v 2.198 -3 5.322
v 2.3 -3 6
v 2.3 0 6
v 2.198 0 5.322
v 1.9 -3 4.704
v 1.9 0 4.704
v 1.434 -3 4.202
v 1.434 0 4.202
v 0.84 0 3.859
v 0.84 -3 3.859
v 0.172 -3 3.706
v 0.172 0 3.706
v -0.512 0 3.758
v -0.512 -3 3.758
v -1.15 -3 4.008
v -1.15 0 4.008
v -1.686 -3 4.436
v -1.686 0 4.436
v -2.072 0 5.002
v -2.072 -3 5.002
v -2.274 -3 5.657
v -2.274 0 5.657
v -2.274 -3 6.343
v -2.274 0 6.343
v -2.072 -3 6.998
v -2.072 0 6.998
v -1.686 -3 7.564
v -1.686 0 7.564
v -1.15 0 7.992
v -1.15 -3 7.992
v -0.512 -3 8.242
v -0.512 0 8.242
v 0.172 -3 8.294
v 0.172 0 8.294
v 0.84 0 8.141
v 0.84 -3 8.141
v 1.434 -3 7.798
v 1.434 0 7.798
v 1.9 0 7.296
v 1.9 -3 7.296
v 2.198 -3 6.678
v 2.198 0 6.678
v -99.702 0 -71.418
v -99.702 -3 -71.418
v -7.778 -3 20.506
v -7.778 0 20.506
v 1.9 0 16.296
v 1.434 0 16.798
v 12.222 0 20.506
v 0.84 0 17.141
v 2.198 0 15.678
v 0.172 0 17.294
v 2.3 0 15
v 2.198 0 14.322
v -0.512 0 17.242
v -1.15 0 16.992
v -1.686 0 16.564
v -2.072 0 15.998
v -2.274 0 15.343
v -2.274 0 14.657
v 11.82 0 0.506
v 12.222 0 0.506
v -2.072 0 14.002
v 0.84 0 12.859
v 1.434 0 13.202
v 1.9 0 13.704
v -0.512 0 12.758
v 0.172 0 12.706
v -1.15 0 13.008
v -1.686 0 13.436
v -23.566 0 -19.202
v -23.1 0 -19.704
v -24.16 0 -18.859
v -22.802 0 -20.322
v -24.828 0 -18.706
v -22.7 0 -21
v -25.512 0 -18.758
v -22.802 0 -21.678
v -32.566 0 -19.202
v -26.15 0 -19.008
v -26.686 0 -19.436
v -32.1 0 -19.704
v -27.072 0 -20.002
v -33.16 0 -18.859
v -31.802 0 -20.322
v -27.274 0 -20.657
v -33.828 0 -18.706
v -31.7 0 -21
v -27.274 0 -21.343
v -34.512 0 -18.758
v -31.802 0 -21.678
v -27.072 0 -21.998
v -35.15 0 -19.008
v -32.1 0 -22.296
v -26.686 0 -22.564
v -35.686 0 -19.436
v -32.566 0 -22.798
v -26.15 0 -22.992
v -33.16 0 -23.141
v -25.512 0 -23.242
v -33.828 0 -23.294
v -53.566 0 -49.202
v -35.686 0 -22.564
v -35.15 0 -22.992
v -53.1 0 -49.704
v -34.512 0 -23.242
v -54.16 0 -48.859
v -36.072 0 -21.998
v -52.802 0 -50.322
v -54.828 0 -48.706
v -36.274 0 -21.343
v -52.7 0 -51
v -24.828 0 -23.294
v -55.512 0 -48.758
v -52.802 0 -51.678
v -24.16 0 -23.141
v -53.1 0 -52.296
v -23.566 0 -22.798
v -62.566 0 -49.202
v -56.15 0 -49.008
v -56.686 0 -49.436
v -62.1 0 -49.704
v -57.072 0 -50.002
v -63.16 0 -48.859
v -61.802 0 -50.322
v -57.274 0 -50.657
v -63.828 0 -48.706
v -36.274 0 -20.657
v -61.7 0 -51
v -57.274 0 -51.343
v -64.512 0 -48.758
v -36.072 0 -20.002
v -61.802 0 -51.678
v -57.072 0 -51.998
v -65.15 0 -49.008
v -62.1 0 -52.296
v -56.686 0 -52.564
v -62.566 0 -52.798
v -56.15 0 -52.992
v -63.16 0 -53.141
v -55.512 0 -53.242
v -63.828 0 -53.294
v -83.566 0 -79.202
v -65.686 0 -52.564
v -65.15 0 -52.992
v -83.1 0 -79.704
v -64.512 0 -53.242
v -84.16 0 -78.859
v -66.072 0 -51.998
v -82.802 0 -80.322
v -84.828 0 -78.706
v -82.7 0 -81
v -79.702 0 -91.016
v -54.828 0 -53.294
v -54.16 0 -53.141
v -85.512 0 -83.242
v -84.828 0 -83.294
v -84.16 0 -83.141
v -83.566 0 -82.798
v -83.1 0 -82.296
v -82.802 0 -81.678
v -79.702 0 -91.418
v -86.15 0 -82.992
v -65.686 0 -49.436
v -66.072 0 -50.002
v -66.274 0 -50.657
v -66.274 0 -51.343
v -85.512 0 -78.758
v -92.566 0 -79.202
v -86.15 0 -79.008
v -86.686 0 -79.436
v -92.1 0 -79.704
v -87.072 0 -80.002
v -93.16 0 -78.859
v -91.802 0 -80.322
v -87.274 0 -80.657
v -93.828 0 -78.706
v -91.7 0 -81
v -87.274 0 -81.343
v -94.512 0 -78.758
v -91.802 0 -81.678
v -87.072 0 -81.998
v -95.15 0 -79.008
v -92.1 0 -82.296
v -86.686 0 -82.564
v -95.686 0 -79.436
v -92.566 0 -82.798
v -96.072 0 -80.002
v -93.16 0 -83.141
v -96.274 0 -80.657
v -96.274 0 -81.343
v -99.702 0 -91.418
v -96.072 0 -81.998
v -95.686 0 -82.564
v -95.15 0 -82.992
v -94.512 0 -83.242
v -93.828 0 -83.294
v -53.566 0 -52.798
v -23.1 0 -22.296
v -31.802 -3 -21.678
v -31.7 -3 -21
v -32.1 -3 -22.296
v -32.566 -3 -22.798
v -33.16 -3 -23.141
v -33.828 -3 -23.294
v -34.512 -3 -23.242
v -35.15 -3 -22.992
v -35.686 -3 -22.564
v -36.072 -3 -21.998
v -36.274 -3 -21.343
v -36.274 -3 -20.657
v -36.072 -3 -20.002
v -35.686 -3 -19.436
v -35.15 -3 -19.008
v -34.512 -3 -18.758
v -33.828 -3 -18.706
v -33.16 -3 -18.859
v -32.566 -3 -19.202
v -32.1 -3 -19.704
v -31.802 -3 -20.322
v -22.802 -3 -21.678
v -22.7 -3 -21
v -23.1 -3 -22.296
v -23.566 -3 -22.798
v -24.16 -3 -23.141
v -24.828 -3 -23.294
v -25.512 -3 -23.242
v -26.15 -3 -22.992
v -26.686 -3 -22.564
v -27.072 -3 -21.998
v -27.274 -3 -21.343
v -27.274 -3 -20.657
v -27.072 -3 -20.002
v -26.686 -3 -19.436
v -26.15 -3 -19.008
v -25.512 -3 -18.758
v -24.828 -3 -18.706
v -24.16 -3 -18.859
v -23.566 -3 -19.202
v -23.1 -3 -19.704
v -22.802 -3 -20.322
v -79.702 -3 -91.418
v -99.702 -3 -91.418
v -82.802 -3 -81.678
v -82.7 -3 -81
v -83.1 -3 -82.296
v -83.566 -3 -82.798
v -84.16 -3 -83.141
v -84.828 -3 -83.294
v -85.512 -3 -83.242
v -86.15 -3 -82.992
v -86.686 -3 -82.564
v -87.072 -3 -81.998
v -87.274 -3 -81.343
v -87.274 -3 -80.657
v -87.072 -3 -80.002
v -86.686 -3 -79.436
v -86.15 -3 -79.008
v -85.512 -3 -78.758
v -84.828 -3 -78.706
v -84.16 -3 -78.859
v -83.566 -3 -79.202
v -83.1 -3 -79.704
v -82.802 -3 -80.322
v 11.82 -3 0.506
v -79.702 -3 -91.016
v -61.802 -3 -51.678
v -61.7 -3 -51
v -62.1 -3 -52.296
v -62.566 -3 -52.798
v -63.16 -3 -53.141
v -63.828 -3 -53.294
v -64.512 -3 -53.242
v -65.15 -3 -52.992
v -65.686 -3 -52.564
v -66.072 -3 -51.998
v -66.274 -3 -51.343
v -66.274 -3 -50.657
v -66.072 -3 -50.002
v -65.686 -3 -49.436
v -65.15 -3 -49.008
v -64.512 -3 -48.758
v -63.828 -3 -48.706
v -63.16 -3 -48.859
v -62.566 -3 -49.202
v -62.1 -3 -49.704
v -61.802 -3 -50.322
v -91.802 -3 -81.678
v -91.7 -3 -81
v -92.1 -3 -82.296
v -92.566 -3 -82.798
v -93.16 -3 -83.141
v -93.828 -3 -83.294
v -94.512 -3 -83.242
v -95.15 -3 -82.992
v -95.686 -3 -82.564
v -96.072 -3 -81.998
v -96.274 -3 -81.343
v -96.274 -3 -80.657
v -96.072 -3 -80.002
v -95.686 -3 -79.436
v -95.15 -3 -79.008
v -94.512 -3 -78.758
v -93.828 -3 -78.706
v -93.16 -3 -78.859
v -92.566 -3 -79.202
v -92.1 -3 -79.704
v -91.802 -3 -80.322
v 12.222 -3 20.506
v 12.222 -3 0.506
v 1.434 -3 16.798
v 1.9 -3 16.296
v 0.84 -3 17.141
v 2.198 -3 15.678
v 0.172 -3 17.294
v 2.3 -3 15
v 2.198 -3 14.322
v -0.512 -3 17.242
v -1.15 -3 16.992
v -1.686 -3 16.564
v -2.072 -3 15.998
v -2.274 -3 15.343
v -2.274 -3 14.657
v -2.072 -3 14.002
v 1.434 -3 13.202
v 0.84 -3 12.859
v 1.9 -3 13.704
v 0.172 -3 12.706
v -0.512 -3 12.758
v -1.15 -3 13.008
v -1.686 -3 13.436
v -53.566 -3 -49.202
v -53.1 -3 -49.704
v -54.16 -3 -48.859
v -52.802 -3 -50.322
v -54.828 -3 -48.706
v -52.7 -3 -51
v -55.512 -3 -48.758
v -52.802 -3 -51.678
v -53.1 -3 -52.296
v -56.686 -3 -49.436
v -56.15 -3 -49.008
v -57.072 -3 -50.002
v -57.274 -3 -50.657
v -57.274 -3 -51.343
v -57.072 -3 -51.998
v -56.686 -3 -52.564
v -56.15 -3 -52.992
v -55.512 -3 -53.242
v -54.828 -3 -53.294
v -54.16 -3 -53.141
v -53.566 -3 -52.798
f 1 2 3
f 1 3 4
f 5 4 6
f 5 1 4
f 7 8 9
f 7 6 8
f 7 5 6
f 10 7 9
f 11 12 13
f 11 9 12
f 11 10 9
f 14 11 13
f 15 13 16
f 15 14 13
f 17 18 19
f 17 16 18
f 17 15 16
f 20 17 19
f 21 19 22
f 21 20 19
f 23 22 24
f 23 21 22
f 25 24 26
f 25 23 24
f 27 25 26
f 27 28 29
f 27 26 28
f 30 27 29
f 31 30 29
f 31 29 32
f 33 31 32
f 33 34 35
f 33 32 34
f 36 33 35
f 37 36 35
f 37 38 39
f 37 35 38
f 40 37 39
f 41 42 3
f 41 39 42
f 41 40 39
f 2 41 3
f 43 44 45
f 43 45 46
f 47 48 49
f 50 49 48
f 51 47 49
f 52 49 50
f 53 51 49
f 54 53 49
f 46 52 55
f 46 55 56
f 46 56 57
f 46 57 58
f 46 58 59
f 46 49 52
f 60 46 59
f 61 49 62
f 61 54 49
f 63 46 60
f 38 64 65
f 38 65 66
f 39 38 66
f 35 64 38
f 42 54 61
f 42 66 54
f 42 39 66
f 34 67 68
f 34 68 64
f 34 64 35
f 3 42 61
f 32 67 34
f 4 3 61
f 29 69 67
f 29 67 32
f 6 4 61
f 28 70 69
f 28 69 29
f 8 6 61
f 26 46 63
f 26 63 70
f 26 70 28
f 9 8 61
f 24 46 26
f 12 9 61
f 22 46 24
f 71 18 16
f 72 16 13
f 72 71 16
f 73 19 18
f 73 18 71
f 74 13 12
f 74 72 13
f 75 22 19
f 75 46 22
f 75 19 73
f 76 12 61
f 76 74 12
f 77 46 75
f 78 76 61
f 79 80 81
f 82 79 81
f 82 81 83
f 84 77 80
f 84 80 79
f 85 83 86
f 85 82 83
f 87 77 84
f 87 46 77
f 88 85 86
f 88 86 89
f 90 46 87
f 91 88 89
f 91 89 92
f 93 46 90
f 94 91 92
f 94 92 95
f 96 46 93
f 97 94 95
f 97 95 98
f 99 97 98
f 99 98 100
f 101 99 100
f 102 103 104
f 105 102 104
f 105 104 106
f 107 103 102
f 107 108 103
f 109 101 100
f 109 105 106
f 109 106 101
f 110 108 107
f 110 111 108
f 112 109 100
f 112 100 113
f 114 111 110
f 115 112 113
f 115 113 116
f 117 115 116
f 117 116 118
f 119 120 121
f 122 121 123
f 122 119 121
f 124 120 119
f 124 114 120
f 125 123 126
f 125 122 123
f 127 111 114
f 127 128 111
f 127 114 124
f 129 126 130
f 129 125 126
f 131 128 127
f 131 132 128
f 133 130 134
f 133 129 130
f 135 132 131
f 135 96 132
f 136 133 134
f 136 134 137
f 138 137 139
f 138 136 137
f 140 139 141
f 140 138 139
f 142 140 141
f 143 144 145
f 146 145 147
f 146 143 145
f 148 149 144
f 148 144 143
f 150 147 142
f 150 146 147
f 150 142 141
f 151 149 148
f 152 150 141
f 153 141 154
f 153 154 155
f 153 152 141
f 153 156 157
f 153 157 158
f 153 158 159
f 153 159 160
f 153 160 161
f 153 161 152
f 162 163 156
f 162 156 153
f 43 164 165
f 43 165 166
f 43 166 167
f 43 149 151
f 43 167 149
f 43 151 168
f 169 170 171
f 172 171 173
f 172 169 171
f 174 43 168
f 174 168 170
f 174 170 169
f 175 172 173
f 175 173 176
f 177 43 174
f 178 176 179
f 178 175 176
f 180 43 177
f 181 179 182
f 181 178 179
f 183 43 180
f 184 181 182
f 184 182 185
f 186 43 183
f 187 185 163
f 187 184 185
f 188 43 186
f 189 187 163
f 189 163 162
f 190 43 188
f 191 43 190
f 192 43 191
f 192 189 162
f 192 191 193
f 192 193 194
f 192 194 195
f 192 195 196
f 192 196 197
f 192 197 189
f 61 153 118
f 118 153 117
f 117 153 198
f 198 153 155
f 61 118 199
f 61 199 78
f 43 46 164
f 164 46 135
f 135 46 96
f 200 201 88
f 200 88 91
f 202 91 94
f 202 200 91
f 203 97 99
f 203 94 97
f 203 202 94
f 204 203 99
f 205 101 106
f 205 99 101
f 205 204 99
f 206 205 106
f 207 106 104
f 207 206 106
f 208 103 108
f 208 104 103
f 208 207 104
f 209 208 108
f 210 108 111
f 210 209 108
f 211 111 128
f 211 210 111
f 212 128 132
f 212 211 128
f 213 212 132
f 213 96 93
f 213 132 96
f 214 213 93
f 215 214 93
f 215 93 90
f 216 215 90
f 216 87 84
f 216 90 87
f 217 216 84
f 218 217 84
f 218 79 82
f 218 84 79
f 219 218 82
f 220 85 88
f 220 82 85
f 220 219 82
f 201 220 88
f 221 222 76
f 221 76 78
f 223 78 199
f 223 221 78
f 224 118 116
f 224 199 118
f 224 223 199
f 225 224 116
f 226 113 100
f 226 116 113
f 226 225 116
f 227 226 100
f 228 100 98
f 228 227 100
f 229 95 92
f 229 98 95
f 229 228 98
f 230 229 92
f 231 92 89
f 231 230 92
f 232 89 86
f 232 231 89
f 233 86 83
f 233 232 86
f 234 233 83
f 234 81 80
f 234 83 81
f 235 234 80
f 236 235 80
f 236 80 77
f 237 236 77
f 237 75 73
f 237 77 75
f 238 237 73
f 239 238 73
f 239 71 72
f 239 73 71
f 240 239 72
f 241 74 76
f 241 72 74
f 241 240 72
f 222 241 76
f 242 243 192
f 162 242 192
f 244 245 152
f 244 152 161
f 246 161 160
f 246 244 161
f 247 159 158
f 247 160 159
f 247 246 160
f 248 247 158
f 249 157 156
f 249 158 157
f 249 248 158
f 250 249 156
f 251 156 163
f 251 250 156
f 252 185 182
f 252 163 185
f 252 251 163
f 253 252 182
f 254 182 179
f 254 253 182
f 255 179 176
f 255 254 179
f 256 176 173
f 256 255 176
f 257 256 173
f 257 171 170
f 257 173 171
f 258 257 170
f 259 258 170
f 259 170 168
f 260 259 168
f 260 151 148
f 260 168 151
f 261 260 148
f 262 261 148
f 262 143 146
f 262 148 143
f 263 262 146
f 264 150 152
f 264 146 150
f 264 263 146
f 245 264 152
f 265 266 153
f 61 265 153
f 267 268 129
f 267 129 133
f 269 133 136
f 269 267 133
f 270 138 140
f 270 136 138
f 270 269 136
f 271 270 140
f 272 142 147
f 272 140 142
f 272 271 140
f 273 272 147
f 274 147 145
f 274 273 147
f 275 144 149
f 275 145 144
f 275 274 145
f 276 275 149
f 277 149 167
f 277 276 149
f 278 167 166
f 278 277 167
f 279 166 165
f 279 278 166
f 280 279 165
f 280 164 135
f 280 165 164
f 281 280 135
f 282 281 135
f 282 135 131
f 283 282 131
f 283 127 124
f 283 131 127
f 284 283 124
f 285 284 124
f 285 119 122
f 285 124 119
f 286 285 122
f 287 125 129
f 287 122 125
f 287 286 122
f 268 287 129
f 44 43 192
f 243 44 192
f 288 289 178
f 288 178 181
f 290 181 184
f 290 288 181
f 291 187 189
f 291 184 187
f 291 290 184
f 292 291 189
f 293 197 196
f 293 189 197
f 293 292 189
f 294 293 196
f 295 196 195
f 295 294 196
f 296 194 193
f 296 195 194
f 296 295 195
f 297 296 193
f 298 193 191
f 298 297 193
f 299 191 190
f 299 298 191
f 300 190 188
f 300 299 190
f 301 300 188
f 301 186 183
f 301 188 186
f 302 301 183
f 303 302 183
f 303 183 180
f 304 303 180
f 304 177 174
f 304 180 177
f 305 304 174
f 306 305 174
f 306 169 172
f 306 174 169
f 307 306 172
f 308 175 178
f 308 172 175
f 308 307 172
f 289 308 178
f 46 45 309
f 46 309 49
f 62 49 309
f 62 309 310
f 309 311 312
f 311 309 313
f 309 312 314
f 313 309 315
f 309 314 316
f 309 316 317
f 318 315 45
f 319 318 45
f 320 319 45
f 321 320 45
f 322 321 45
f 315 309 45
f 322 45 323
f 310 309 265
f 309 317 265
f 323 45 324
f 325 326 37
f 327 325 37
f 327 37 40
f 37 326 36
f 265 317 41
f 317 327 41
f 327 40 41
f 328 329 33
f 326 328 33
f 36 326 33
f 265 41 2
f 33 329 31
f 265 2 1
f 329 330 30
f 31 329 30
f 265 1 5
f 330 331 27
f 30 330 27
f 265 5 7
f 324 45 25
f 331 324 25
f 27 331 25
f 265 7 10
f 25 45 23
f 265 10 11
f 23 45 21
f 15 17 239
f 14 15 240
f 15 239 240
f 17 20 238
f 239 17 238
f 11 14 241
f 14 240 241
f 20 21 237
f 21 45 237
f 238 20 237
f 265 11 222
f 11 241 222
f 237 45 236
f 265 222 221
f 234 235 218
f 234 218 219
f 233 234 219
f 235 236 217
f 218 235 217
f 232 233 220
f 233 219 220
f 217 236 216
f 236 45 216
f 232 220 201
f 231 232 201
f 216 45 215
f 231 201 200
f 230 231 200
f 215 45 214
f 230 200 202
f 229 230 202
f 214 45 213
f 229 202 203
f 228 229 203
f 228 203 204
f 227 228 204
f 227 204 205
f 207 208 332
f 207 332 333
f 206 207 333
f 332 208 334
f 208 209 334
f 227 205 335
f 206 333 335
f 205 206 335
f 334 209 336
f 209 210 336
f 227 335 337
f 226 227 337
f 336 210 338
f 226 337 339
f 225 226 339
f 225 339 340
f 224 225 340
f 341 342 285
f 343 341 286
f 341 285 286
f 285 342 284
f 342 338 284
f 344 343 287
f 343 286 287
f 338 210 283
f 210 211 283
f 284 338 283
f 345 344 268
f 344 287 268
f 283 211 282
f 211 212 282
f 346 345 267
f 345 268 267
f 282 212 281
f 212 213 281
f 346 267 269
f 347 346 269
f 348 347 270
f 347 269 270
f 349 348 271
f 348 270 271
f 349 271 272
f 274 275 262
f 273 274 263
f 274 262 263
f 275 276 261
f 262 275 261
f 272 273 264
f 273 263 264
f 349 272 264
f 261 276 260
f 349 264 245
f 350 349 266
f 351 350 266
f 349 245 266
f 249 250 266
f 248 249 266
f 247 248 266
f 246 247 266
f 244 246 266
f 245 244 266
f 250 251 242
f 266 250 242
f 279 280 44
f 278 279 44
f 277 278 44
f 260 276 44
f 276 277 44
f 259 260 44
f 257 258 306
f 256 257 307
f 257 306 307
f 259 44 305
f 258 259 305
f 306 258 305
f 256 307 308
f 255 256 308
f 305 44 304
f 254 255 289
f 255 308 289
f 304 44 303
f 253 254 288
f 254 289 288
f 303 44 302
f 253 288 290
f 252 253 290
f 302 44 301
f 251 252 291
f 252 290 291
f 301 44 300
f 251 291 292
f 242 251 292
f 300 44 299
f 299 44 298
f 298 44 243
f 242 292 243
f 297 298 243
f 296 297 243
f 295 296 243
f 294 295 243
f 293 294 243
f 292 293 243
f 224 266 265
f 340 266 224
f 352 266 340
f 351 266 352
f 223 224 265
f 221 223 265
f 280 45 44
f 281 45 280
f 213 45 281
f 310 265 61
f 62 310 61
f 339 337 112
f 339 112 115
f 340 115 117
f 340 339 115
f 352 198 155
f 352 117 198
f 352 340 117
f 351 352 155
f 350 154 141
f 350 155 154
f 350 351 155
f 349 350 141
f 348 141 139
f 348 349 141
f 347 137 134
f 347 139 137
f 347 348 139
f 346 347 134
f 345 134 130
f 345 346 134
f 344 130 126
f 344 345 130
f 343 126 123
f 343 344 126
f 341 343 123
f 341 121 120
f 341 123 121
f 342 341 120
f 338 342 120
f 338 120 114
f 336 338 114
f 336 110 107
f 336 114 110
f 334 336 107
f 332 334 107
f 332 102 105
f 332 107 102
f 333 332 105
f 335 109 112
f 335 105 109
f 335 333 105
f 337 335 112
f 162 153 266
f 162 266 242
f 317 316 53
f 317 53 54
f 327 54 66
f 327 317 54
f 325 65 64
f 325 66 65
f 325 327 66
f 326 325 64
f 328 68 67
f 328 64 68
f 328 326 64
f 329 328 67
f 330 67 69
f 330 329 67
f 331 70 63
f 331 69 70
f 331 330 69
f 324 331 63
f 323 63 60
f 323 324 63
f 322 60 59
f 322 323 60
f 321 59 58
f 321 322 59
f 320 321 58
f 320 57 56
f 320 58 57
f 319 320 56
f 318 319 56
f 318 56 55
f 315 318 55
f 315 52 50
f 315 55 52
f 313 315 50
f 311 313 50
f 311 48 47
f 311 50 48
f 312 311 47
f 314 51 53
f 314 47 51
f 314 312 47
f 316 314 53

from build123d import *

# Parameters (mm, degrees)
CYLINDER051_R             = 2.3
CYLINDER051_DEPTH         = 100
ARRAY001029_X_COUNT       = 2
ARRAY001029_X_PITCH       = 9
ARRAY001029_Z_COUNT       = 3
ARRAY001029_Z_PITCH       = 42.426407
CYLINDER048_R             = 2.3
CYLINDER048_DEPTH         = 100
ARRAY001026_Z_COUNT       = 2
ARRAY001026_Z_PITCH       = 9
BOX026_W                  = 20
BOX026_H                  = 3
BOX026_DEPTH              = 20
BOX026_PLACEMENT_ANGLE    = 45
BOX027_W                  = 20
BOX027_H                  = 3
BOX027_DEPTH              = 20
BOX027_PLACEMENT_ANGLE    = 45
BOX025_W                  = 28
BOX025_H                  = 3
BOX025_DEPTH              = 130
FUSION021_PLACEMENT_ANGLE = 45


with BuildPart() as horizontal_hole_array003:
    # Cylinder051 → Cylinder051 (new body)
    with BuildSketch(Plane(origin=(4, -10, 5), x_dir=(1, 0, 0), z_dir=(0, 1, 0))):
        Circle(CYLINDER051_R)
    extrude(amount=CYLINDER051_DEPTH)

    # Array001029 X: horizontal hole array003 ×2


with BuildPart() as horizontal_hole_array003_1:
    add(horizontal_hole_array003.part)
    with Locations(*[(i * ARRAY001029_X_PITCH, 0, 0) for i in range(1, ARRAY001029_X_COUNT)]):
        add(horizontal_hole_array003.part)

    # Array001029 Z: horizontal hole array003 ×3


with BuildPart() as horizontal_hole_array003_2:
    add(horizontal_hole_array003_1.part)
    with Locations(*[Vector(0.707107, 0, 0.707107) * (i * ARRAY001029_Z_PITCH) for i in range(1, ARRAY001029_Z_COUNT)]):
        add(horizontal_hole_array003_1.part)


with BuildPart() as horizontal_hole_array003_3:
    # Array001029 placement: moved
    add(horizontal_hole_array003_2.part.moved(Location((-98, 0, -86))))


with BuildPart() as fusion024:
    # Cylinder048 → Cylinder048 (new body)
    with BuildSketch(Plane(origin=(0, -10, 6), x_dir=(1, 0, 0), z_dir=(0, 1, 0))):
        Circle(CYLINDER048_R)
    extrude(amount=CYLINDER048_DEPTH)

    # Array001026 Z: Fusion024 ×2


with BuildPart() as fusion024_1:
    add(fusion024.part)
    with Locations(*[(0, 0, i * ARRAY001026_Z_PITCH) for i in range(1, ARRAY001026_Z_COUNT)]):
        add(fusion024.part)

    # Fusion024: union horizontal hole array003
    add(horizontal_hole_array003_3.part)


with BuildPart() as side_cube:
    # Box026 → Box026 (new body)
    with BuildSketch(Plane.XY):
        with Locations((10, 1.5)):
            Rectangle(BOX026_W, BOX026_H)
    extrude(amount=BOX026_DEPTH)


with BuildPart() as side_cube_1:
    # Box026 placement: moved
    add(side_cube.part.moved(Location((0, 0, 130))).rotate(Axis((0, 0, 130), (0, 1, 0)), BOX026_PLACEMENT_ANGLE))


with BuildPart() as side_cube001:
    # Box027 → Box027 (new body)
    with BuildSketch(Plane.XY):
        with Locations((10, 1.5)):
            Rectangle(BOX027_W, BOX027_H)
    extrude(amount=BOX027_DEPTH)


with BuildPart() as side_cube001_1:
    # Box027 placement: moved
    add(side_cube001.part.rotate(Axis((0, 0, 0), (0, 1, 0)), BOX027_PLACEMENT_ANGLE))


with BuildPart() as stand_attachment_side_plate_cut:
    # Box025 → Box025 (new body)
    with BuildSketch(Plane.XY):
        with Locations((14, 1.5)):
            Rectangle(BOX025_W, BOX025_H)
    extrude(amount=BOX025_DEPTH)

    # Fusion021: union side cube, side cube001
    add(side_cube_1.part)
    add(side_cube001_1.part)


with BuildPart() as stand_attachment_side_plate_cut_1:
    # Fusion021 placement: moved
    add(stand_attachment_side_plate_cut.part.moved(Location((-99.702056, -3, -71.417785))).rotate(Axis((-99.702056, -3, -71.417785), (0, 1, 0)), FUSION021_PLACEMENT_ANGLE))

    # Cut019: cut Fusion024
    add(fusion024_1.part, mode=Mode.SUBTRACT)


solid = stand_attachment_side_plate_cut_1.part
